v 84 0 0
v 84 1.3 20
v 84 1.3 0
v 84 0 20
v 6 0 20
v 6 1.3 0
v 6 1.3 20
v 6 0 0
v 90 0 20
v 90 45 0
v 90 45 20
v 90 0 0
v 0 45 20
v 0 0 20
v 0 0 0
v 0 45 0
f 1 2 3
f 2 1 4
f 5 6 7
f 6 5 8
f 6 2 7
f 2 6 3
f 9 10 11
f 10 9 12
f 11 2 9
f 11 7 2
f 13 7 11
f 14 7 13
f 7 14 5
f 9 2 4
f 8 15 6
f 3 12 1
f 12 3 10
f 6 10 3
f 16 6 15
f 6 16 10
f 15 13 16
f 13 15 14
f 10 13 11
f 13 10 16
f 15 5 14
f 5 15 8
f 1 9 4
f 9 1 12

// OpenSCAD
// Drying rack for 10 microscope slides
// Base block: 90 x 45 x 20 mm
// 10 slots: 77 mm long (X), 1.6 mm wide (Y), 10 mm deep, 3.5 mm pitch

// Base block dimensions
BLOCK_X = 90;
BLOCK_Y = 45;
BLOCK_Z = 20;

// Slot dimensions
SLOT_LENGTH = 77;
SLOT_WIDTH = 1.6;
SLOT_DEPTH = 10;

// Slot spacing
SLOT_PITCH = 3.5;
NUM_SLOTS = 10;

// Calculate slot group width and offset
SLOT_GROUP_WIDTH = (NUM_SLOTS - 1) * SLOT_PITCH;
SLOT_Y_OFFSET = SLOT_GROUP_WIDTH / 2;

// Slot X offset to centre the 77 mm slot in the 90 mm block
SLOT_X_OFFSET = (BLOCK_X - SLOT_LENGTH) / 2;

// Slot Y positions (centred on block)
SLOT_Y_START = -SLOT_Y_OFFSET;

// Cutting shape extension to avoid coplanar faces
EXTEND = 0.5;

module base_block() {
    cube([BLOCK_X, BLOCK_Y, BLOCK_Z], center = false);
}

module slot_cut() {
    // Slot extends slightly past the top face (z=20) and bottom of cut (z=10)
    // Slot is centred in X, positioned at specific Y
    translate([
        SLOT_X_OFFSET - EXTEND,
        SLOT_Y_START - SLOT_WIDTH / 2 - EXTEND,
        -EXTEND
    ]) {
        cube([
            SLOT_LENGTH + 2 * EXTEND,
            SLOT_WIDTH + 2 * EXTEND,
            SLOT_DEPTH + BLOCK_Z + 2 * EXTEND
        ], center = false);
    }
}

// Build the rack: base block with slots cut out
difference() {
    base_block();
    
    for (i = [0 : NUM_SLOTS - 1]) {
        slot_y = SLOT_Y_START + i * SLOT_PITCH;
        translate([0, slot_y, 0]) {
            slot_cut();
        }
    }
}
